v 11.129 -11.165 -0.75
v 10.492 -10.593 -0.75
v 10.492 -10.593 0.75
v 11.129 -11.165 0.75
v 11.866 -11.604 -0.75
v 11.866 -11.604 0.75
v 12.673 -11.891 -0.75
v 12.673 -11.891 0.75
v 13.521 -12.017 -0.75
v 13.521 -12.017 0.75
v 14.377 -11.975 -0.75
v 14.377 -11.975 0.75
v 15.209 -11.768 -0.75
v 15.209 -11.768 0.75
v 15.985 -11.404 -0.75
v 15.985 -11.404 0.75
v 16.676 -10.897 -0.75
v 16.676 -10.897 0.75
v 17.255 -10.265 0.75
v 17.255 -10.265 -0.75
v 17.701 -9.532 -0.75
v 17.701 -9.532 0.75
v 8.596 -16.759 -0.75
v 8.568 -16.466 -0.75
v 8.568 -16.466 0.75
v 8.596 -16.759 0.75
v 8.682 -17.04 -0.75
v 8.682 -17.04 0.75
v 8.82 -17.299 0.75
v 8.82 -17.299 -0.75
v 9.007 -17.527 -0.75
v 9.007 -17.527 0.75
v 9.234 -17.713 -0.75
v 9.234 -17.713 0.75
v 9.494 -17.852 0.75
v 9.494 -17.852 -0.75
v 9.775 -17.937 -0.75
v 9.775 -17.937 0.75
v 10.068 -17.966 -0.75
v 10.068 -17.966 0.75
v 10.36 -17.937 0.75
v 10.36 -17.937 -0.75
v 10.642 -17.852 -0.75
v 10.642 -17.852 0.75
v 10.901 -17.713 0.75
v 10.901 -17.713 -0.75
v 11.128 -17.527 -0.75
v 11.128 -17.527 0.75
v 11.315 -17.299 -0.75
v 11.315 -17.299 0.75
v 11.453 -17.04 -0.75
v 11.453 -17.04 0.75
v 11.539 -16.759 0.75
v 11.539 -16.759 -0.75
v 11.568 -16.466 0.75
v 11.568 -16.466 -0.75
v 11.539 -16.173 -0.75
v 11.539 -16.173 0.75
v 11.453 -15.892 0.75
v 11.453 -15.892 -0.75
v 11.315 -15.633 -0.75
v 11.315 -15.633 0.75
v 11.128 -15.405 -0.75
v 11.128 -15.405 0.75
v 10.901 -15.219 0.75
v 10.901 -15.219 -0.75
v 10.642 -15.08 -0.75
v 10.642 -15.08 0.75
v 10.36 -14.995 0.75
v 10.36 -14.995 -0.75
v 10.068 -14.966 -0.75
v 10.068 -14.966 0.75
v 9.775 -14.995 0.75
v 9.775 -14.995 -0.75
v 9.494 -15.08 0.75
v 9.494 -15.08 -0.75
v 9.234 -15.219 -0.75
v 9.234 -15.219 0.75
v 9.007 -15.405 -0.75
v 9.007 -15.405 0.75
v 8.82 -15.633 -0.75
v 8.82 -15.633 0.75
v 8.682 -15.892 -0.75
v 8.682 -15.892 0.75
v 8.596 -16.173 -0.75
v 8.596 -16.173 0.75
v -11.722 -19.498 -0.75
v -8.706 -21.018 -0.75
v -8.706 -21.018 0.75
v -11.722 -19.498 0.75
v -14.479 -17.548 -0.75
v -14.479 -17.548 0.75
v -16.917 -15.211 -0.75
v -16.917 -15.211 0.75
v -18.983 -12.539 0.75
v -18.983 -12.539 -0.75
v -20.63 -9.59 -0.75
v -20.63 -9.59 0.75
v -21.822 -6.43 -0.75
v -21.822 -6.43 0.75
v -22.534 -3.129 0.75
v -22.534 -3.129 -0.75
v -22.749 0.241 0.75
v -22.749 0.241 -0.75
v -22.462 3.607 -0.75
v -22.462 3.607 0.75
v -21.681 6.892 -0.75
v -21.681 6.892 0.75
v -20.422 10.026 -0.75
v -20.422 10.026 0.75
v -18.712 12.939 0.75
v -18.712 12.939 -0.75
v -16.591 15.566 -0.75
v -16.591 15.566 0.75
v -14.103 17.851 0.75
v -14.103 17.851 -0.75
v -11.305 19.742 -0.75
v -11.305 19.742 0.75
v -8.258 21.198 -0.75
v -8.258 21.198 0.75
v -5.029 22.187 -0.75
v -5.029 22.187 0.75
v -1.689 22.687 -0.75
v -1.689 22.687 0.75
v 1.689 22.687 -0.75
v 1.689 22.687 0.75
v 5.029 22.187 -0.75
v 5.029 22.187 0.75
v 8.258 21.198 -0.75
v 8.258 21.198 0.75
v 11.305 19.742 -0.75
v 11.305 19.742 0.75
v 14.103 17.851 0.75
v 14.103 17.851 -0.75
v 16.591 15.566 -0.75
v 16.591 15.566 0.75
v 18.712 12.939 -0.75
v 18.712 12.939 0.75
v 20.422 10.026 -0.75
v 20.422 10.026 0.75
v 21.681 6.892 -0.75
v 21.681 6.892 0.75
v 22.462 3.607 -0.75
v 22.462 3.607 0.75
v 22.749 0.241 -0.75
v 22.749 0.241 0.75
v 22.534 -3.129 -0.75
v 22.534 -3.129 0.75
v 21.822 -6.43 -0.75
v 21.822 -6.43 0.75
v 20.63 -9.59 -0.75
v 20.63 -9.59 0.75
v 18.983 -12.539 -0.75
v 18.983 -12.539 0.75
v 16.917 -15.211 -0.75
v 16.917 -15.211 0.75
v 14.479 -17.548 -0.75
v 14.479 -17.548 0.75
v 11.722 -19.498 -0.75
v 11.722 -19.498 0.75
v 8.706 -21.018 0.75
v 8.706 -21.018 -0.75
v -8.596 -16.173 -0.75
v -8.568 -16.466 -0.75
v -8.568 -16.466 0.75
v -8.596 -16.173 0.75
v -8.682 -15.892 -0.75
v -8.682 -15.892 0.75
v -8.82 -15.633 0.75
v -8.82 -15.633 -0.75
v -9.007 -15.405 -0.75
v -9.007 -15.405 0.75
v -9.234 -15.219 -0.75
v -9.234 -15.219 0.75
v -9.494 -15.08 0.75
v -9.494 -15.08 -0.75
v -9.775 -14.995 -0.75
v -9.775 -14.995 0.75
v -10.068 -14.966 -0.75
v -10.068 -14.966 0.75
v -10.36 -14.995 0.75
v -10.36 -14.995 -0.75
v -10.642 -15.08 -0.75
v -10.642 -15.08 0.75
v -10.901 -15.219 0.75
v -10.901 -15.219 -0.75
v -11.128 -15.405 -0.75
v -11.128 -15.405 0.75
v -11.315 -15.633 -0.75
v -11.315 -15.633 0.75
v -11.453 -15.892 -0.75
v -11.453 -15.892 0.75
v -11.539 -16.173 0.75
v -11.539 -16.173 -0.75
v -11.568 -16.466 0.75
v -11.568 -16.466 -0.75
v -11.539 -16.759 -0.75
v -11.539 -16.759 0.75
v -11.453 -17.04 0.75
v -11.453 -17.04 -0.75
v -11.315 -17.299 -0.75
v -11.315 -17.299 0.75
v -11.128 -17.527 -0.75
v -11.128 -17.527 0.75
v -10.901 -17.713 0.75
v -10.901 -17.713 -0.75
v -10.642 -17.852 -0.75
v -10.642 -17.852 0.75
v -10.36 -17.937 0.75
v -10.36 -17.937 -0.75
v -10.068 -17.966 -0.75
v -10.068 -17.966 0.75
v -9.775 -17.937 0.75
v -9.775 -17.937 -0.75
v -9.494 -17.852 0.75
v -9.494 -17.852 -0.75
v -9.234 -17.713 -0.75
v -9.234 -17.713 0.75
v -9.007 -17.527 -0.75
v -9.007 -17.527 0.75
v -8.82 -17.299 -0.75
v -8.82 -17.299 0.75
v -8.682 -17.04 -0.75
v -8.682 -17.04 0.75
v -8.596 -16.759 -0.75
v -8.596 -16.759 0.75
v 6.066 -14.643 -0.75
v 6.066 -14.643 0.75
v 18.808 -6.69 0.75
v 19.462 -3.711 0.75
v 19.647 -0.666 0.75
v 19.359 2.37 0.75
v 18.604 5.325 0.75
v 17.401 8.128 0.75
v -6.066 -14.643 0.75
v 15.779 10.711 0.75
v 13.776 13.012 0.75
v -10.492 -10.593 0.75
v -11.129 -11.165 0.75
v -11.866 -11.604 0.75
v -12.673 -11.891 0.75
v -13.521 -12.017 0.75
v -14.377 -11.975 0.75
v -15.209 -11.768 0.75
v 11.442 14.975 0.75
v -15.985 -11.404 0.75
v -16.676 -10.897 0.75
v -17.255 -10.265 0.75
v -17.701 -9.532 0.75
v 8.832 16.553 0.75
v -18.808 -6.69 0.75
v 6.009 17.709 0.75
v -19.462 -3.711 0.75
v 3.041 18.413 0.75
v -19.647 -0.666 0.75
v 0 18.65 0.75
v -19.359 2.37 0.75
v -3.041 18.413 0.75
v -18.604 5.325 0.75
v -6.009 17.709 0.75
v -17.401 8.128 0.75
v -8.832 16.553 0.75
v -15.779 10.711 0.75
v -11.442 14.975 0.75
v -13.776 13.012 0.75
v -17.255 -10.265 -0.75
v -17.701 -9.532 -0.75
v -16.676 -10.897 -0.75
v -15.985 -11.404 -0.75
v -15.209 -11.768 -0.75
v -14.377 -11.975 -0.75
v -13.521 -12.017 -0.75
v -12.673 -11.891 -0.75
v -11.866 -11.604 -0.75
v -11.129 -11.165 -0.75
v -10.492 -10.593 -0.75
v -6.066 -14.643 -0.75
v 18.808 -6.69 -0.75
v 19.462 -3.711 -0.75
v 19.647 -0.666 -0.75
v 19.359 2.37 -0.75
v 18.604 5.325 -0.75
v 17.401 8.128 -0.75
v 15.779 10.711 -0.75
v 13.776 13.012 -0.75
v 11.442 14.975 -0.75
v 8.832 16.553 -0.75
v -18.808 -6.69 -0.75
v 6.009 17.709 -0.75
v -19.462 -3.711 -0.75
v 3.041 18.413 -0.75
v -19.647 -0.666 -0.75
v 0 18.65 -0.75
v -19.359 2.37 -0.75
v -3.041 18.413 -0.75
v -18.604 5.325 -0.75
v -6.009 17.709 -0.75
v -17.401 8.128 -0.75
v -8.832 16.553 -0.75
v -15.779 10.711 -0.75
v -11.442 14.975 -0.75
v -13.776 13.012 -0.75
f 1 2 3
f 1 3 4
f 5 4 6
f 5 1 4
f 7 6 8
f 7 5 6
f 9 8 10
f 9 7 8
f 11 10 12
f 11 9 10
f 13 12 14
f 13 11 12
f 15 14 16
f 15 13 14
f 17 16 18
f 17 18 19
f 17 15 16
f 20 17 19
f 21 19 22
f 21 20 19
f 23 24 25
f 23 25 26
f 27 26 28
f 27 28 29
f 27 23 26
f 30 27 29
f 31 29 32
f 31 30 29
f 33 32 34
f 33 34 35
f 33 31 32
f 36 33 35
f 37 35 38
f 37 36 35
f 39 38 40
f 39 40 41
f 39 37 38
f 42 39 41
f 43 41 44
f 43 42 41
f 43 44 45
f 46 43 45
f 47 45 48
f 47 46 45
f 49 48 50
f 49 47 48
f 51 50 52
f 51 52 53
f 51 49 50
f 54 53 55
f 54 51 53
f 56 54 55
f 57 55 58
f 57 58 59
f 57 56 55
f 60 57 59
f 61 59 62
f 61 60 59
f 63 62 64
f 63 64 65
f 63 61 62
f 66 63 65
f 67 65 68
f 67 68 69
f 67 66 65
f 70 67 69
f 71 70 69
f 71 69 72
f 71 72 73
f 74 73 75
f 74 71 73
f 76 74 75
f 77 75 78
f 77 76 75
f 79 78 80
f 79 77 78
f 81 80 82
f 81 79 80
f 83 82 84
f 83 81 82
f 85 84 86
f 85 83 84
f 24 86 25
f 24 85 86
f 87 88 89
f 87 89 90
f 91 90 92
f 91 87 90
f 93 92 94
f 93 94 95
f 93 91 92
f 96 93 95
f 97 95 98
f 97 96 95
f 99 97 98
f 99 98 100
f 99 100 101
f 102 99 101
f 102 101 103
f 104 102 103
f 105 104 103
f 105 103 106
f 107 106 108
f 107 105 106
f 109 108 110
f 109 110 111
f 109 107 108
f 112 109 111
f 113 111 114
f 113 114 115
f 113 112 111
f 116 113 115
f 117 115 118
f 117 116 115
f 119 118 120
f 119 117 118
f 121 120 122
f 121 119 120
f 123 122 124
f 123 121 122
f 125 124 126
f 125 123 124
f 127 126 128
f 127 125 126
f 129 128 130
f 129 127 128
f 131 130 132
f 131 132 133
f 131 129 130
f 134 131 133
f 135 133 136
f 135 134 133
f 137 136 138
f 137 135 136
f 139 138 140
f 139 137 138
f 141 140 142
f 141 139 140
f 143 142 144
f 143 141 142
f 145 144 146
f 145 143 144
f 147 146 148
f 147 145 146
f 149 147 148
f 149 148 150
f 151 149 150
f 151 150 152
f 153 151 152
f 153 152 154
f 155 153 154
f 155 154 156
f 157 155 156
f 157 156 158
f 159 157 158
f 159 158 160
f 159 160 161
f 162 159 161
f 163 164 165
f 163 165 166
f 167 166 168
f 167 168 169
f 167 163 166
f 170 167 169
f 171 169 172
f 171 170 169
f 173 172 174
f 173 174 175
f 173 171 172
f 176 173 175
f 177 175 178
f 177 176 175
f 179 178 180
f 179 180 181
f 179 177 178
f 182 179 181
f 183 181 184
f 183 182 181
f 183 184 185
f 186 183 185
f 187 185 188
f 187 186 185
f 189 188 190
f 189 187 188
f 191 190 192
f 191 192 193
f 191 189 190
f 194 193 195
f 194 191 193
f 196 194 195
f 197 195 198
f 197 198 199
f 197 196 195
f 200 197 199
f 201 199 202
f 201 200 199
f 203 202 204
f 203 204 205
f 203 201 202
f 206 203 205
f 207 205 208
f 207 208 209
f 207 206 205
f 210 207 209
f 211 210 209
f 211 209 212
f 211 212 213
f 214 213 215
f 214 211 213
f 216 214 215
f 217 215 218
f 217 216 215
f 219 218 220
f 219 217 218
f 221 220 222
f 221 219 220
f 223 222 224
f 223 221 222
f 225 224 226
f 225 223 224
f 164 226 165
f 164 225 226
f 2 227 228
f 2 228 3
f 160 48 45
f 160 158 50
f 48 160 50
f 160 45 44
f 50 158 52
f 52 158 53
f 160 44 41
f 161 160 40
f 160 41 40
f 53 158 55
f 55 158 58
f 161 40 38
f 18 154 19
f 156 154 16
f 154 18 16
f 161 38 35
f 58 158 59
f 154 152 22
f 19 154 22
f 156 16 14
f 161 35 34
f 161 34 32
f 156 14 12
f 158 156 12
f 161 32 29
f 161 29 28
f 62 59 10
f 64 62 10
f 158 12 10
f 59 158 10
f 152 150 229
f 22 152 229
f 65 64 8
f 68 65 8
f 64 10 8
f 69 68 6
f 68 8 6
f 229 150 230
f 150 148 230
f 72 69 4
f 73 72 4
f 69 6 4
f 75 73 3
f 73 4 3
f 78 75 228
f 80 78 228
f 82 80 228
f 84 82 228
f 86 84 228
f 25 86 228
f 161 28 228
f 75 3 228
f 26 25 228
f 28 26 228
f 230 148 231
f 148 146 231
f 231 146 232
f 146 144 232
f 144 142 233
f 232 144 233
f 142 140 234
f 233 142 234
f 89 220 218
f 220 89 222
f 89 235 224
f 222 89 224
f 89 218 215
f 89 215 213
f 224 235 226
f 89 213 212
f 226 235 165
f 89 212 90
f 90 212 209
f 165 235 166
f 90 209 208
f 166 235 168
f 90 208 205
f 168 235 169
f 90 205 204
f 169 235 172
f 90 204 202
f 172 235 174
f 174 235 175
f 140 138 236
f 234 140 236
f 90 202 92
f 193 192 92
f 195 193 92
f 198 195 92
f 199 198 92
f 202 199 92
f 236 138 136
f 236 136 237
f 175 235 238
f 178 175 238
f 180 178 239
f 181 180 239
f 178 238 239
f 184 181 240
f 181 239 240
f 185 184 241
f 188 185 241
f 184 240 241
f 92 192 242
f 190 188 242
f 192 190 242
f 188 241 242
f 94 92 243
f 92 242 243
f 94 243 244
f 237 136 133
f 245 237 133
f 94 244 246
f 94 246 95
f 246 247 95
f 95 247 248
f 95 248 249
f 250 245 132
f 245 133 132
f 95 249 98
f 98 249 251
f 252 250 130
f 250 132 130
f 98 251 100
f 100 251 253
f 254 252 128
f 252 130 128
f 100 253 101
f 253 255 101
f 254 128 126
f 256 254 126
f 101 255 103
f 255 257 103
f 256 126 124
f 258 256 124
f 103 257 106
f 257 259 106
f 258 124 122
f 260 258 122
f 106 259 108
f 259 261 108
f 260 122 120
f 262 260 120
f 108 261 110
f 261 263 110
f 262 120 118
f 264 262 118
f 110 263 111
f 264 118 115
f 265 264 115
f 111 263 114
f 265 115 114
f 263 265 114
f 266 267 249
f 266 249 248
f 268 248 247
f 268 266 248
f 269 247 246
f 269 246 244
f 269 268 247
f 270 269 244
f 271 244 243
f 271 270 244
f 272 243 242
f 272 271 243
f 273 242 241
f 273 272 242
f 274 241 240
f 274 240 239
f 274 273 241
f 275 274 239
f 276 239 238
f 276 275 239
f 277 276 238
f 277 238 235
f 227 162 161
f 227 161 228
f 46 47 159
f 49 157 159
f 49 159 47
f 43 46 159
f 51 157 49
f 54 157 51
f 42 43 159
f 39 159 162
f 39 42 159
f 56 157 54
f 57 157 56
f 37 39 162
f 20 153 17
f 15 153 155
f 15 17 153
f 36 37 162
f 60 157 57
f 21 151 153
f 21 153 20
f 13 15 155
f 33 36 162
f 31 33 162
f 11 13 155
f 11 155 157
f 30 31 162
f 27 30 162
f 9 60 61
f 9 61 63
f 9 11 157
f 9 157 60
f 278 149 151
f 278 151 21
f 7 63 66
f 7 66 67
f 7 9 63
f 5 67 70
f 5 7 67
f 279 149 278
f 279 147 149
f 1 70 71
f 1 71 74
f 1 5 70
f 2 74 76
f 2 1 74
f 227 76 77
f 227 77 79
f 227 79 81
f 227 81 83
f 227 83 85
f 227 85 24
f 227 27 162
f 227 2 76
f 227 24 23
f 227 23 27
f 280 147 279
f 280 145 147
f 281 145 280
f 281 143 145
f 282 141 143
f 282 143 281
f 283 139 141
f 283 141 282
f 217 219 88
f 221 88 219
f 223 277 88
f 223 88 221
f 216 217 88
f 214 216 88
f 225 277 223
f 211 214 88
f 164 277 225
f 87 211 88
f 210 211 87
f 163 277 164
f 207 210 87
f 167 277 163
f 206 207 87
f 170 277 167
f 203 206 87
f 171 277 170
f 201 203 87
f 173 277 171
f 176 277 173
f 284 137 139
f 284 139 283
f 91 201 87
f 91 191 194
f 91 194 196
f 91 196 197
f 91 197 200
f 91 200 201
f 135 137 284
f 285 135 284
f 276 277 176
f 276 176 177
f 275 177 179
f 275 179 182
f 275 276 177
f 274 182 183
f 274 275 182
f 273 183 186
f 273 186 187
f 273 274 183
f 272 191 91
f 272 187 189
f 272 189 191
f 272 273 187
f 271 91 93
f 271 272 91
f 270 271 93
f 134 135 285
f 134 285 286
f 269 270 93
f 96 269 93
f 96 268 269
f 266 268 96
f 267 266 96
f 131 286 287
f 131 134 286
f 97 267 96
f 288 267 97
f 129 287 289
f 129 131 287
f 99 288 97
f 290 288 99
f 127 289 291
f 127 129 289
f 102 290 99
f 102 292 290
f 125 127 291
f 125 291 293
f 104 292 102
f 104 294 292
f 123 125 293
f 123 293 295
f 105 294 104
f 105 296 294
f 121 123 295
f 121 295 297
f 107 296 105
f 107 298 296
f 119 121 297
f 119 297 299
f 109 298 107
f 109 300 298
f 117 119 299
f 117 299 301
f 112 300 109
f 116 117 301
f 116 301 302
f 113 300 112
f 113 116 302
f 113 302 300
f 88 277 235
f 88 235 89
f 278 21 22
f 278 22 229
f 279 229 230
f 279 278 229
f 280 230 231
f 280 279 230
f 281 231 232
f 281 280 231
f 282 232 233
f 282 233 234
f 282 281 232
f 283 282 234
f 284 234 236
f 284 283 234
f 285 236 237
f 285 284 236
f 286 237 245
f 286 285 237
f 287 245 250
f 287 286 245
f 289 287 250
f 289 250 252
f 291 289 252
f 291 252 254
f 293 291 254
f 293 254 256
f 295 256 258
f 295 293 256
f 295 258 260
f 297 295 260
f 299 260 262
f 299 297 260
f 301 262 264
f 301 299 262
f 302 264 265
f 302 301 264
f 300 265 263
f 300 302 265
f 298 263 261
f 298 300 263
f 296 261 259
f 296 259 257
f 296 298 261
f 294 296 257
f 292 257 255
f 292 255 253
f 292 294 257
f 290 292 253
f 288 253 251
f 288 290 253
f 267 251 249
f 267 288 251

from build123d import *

# Parameters (mm, degrees)
EXTRUDE_1003_DEPTH      = 0.75
EXTRUDE_1003_DEPTH_BACK = 0.75
SKETCH_1_R              = 1.5


with BuildPart() as part:
    # 草图1 → Extrude 1003 (new, two sides: drawn at the far end of the back side and taken through both)
    with BuildSketch(Plane.XY.offset(-EXTRUDE_1003_DEPTH_BACK)):
        with BuildLine():
            Line((-10.491561876, -10.592532295), (-6.065532403, -14.64349059))
            Line((-6.065532403, -14.64349059), (-8.706048086, -21.018259365))
            ThreePointArc((-8.706048086, -21.018259365), (0, 22.75), (8.706048086, -21.018259365))
            Line((8.706048086, -21.018259365), (6.065532403, -14.64349059))
            Line((6.065532403, -14.64349059), (10.491561876, -10.592532295))
            ThreePointArc((10.491561876, -10.592532295), (14.377460618, -11.975014118), (17.700870528, -9.532390201))
            ThreePointArc((17.700870528, -9.532390201), (0, 18.65), (-17.700870528, -9.532390201))
            ThreePointArc((-17.700870528, -9.532390201), (-14.377460618, -11.975014118), (-10.491561876, -10.592532295))
        make_face()
        with Locations((-10.067656556, -16.46609521)):
            Circle(SKETCH_1_R, mode=Mode.SUBTRACT)
        with Locations((10.067656556, -16.46609521)):
            Circle(SKETCH_1_R, mode=Mode.SUBTRACT)
    extrude(amount=EXTRUDE_1003_DEPTH + EXTRUDE_1003_DEPTH_BACK)


solid = part.part
